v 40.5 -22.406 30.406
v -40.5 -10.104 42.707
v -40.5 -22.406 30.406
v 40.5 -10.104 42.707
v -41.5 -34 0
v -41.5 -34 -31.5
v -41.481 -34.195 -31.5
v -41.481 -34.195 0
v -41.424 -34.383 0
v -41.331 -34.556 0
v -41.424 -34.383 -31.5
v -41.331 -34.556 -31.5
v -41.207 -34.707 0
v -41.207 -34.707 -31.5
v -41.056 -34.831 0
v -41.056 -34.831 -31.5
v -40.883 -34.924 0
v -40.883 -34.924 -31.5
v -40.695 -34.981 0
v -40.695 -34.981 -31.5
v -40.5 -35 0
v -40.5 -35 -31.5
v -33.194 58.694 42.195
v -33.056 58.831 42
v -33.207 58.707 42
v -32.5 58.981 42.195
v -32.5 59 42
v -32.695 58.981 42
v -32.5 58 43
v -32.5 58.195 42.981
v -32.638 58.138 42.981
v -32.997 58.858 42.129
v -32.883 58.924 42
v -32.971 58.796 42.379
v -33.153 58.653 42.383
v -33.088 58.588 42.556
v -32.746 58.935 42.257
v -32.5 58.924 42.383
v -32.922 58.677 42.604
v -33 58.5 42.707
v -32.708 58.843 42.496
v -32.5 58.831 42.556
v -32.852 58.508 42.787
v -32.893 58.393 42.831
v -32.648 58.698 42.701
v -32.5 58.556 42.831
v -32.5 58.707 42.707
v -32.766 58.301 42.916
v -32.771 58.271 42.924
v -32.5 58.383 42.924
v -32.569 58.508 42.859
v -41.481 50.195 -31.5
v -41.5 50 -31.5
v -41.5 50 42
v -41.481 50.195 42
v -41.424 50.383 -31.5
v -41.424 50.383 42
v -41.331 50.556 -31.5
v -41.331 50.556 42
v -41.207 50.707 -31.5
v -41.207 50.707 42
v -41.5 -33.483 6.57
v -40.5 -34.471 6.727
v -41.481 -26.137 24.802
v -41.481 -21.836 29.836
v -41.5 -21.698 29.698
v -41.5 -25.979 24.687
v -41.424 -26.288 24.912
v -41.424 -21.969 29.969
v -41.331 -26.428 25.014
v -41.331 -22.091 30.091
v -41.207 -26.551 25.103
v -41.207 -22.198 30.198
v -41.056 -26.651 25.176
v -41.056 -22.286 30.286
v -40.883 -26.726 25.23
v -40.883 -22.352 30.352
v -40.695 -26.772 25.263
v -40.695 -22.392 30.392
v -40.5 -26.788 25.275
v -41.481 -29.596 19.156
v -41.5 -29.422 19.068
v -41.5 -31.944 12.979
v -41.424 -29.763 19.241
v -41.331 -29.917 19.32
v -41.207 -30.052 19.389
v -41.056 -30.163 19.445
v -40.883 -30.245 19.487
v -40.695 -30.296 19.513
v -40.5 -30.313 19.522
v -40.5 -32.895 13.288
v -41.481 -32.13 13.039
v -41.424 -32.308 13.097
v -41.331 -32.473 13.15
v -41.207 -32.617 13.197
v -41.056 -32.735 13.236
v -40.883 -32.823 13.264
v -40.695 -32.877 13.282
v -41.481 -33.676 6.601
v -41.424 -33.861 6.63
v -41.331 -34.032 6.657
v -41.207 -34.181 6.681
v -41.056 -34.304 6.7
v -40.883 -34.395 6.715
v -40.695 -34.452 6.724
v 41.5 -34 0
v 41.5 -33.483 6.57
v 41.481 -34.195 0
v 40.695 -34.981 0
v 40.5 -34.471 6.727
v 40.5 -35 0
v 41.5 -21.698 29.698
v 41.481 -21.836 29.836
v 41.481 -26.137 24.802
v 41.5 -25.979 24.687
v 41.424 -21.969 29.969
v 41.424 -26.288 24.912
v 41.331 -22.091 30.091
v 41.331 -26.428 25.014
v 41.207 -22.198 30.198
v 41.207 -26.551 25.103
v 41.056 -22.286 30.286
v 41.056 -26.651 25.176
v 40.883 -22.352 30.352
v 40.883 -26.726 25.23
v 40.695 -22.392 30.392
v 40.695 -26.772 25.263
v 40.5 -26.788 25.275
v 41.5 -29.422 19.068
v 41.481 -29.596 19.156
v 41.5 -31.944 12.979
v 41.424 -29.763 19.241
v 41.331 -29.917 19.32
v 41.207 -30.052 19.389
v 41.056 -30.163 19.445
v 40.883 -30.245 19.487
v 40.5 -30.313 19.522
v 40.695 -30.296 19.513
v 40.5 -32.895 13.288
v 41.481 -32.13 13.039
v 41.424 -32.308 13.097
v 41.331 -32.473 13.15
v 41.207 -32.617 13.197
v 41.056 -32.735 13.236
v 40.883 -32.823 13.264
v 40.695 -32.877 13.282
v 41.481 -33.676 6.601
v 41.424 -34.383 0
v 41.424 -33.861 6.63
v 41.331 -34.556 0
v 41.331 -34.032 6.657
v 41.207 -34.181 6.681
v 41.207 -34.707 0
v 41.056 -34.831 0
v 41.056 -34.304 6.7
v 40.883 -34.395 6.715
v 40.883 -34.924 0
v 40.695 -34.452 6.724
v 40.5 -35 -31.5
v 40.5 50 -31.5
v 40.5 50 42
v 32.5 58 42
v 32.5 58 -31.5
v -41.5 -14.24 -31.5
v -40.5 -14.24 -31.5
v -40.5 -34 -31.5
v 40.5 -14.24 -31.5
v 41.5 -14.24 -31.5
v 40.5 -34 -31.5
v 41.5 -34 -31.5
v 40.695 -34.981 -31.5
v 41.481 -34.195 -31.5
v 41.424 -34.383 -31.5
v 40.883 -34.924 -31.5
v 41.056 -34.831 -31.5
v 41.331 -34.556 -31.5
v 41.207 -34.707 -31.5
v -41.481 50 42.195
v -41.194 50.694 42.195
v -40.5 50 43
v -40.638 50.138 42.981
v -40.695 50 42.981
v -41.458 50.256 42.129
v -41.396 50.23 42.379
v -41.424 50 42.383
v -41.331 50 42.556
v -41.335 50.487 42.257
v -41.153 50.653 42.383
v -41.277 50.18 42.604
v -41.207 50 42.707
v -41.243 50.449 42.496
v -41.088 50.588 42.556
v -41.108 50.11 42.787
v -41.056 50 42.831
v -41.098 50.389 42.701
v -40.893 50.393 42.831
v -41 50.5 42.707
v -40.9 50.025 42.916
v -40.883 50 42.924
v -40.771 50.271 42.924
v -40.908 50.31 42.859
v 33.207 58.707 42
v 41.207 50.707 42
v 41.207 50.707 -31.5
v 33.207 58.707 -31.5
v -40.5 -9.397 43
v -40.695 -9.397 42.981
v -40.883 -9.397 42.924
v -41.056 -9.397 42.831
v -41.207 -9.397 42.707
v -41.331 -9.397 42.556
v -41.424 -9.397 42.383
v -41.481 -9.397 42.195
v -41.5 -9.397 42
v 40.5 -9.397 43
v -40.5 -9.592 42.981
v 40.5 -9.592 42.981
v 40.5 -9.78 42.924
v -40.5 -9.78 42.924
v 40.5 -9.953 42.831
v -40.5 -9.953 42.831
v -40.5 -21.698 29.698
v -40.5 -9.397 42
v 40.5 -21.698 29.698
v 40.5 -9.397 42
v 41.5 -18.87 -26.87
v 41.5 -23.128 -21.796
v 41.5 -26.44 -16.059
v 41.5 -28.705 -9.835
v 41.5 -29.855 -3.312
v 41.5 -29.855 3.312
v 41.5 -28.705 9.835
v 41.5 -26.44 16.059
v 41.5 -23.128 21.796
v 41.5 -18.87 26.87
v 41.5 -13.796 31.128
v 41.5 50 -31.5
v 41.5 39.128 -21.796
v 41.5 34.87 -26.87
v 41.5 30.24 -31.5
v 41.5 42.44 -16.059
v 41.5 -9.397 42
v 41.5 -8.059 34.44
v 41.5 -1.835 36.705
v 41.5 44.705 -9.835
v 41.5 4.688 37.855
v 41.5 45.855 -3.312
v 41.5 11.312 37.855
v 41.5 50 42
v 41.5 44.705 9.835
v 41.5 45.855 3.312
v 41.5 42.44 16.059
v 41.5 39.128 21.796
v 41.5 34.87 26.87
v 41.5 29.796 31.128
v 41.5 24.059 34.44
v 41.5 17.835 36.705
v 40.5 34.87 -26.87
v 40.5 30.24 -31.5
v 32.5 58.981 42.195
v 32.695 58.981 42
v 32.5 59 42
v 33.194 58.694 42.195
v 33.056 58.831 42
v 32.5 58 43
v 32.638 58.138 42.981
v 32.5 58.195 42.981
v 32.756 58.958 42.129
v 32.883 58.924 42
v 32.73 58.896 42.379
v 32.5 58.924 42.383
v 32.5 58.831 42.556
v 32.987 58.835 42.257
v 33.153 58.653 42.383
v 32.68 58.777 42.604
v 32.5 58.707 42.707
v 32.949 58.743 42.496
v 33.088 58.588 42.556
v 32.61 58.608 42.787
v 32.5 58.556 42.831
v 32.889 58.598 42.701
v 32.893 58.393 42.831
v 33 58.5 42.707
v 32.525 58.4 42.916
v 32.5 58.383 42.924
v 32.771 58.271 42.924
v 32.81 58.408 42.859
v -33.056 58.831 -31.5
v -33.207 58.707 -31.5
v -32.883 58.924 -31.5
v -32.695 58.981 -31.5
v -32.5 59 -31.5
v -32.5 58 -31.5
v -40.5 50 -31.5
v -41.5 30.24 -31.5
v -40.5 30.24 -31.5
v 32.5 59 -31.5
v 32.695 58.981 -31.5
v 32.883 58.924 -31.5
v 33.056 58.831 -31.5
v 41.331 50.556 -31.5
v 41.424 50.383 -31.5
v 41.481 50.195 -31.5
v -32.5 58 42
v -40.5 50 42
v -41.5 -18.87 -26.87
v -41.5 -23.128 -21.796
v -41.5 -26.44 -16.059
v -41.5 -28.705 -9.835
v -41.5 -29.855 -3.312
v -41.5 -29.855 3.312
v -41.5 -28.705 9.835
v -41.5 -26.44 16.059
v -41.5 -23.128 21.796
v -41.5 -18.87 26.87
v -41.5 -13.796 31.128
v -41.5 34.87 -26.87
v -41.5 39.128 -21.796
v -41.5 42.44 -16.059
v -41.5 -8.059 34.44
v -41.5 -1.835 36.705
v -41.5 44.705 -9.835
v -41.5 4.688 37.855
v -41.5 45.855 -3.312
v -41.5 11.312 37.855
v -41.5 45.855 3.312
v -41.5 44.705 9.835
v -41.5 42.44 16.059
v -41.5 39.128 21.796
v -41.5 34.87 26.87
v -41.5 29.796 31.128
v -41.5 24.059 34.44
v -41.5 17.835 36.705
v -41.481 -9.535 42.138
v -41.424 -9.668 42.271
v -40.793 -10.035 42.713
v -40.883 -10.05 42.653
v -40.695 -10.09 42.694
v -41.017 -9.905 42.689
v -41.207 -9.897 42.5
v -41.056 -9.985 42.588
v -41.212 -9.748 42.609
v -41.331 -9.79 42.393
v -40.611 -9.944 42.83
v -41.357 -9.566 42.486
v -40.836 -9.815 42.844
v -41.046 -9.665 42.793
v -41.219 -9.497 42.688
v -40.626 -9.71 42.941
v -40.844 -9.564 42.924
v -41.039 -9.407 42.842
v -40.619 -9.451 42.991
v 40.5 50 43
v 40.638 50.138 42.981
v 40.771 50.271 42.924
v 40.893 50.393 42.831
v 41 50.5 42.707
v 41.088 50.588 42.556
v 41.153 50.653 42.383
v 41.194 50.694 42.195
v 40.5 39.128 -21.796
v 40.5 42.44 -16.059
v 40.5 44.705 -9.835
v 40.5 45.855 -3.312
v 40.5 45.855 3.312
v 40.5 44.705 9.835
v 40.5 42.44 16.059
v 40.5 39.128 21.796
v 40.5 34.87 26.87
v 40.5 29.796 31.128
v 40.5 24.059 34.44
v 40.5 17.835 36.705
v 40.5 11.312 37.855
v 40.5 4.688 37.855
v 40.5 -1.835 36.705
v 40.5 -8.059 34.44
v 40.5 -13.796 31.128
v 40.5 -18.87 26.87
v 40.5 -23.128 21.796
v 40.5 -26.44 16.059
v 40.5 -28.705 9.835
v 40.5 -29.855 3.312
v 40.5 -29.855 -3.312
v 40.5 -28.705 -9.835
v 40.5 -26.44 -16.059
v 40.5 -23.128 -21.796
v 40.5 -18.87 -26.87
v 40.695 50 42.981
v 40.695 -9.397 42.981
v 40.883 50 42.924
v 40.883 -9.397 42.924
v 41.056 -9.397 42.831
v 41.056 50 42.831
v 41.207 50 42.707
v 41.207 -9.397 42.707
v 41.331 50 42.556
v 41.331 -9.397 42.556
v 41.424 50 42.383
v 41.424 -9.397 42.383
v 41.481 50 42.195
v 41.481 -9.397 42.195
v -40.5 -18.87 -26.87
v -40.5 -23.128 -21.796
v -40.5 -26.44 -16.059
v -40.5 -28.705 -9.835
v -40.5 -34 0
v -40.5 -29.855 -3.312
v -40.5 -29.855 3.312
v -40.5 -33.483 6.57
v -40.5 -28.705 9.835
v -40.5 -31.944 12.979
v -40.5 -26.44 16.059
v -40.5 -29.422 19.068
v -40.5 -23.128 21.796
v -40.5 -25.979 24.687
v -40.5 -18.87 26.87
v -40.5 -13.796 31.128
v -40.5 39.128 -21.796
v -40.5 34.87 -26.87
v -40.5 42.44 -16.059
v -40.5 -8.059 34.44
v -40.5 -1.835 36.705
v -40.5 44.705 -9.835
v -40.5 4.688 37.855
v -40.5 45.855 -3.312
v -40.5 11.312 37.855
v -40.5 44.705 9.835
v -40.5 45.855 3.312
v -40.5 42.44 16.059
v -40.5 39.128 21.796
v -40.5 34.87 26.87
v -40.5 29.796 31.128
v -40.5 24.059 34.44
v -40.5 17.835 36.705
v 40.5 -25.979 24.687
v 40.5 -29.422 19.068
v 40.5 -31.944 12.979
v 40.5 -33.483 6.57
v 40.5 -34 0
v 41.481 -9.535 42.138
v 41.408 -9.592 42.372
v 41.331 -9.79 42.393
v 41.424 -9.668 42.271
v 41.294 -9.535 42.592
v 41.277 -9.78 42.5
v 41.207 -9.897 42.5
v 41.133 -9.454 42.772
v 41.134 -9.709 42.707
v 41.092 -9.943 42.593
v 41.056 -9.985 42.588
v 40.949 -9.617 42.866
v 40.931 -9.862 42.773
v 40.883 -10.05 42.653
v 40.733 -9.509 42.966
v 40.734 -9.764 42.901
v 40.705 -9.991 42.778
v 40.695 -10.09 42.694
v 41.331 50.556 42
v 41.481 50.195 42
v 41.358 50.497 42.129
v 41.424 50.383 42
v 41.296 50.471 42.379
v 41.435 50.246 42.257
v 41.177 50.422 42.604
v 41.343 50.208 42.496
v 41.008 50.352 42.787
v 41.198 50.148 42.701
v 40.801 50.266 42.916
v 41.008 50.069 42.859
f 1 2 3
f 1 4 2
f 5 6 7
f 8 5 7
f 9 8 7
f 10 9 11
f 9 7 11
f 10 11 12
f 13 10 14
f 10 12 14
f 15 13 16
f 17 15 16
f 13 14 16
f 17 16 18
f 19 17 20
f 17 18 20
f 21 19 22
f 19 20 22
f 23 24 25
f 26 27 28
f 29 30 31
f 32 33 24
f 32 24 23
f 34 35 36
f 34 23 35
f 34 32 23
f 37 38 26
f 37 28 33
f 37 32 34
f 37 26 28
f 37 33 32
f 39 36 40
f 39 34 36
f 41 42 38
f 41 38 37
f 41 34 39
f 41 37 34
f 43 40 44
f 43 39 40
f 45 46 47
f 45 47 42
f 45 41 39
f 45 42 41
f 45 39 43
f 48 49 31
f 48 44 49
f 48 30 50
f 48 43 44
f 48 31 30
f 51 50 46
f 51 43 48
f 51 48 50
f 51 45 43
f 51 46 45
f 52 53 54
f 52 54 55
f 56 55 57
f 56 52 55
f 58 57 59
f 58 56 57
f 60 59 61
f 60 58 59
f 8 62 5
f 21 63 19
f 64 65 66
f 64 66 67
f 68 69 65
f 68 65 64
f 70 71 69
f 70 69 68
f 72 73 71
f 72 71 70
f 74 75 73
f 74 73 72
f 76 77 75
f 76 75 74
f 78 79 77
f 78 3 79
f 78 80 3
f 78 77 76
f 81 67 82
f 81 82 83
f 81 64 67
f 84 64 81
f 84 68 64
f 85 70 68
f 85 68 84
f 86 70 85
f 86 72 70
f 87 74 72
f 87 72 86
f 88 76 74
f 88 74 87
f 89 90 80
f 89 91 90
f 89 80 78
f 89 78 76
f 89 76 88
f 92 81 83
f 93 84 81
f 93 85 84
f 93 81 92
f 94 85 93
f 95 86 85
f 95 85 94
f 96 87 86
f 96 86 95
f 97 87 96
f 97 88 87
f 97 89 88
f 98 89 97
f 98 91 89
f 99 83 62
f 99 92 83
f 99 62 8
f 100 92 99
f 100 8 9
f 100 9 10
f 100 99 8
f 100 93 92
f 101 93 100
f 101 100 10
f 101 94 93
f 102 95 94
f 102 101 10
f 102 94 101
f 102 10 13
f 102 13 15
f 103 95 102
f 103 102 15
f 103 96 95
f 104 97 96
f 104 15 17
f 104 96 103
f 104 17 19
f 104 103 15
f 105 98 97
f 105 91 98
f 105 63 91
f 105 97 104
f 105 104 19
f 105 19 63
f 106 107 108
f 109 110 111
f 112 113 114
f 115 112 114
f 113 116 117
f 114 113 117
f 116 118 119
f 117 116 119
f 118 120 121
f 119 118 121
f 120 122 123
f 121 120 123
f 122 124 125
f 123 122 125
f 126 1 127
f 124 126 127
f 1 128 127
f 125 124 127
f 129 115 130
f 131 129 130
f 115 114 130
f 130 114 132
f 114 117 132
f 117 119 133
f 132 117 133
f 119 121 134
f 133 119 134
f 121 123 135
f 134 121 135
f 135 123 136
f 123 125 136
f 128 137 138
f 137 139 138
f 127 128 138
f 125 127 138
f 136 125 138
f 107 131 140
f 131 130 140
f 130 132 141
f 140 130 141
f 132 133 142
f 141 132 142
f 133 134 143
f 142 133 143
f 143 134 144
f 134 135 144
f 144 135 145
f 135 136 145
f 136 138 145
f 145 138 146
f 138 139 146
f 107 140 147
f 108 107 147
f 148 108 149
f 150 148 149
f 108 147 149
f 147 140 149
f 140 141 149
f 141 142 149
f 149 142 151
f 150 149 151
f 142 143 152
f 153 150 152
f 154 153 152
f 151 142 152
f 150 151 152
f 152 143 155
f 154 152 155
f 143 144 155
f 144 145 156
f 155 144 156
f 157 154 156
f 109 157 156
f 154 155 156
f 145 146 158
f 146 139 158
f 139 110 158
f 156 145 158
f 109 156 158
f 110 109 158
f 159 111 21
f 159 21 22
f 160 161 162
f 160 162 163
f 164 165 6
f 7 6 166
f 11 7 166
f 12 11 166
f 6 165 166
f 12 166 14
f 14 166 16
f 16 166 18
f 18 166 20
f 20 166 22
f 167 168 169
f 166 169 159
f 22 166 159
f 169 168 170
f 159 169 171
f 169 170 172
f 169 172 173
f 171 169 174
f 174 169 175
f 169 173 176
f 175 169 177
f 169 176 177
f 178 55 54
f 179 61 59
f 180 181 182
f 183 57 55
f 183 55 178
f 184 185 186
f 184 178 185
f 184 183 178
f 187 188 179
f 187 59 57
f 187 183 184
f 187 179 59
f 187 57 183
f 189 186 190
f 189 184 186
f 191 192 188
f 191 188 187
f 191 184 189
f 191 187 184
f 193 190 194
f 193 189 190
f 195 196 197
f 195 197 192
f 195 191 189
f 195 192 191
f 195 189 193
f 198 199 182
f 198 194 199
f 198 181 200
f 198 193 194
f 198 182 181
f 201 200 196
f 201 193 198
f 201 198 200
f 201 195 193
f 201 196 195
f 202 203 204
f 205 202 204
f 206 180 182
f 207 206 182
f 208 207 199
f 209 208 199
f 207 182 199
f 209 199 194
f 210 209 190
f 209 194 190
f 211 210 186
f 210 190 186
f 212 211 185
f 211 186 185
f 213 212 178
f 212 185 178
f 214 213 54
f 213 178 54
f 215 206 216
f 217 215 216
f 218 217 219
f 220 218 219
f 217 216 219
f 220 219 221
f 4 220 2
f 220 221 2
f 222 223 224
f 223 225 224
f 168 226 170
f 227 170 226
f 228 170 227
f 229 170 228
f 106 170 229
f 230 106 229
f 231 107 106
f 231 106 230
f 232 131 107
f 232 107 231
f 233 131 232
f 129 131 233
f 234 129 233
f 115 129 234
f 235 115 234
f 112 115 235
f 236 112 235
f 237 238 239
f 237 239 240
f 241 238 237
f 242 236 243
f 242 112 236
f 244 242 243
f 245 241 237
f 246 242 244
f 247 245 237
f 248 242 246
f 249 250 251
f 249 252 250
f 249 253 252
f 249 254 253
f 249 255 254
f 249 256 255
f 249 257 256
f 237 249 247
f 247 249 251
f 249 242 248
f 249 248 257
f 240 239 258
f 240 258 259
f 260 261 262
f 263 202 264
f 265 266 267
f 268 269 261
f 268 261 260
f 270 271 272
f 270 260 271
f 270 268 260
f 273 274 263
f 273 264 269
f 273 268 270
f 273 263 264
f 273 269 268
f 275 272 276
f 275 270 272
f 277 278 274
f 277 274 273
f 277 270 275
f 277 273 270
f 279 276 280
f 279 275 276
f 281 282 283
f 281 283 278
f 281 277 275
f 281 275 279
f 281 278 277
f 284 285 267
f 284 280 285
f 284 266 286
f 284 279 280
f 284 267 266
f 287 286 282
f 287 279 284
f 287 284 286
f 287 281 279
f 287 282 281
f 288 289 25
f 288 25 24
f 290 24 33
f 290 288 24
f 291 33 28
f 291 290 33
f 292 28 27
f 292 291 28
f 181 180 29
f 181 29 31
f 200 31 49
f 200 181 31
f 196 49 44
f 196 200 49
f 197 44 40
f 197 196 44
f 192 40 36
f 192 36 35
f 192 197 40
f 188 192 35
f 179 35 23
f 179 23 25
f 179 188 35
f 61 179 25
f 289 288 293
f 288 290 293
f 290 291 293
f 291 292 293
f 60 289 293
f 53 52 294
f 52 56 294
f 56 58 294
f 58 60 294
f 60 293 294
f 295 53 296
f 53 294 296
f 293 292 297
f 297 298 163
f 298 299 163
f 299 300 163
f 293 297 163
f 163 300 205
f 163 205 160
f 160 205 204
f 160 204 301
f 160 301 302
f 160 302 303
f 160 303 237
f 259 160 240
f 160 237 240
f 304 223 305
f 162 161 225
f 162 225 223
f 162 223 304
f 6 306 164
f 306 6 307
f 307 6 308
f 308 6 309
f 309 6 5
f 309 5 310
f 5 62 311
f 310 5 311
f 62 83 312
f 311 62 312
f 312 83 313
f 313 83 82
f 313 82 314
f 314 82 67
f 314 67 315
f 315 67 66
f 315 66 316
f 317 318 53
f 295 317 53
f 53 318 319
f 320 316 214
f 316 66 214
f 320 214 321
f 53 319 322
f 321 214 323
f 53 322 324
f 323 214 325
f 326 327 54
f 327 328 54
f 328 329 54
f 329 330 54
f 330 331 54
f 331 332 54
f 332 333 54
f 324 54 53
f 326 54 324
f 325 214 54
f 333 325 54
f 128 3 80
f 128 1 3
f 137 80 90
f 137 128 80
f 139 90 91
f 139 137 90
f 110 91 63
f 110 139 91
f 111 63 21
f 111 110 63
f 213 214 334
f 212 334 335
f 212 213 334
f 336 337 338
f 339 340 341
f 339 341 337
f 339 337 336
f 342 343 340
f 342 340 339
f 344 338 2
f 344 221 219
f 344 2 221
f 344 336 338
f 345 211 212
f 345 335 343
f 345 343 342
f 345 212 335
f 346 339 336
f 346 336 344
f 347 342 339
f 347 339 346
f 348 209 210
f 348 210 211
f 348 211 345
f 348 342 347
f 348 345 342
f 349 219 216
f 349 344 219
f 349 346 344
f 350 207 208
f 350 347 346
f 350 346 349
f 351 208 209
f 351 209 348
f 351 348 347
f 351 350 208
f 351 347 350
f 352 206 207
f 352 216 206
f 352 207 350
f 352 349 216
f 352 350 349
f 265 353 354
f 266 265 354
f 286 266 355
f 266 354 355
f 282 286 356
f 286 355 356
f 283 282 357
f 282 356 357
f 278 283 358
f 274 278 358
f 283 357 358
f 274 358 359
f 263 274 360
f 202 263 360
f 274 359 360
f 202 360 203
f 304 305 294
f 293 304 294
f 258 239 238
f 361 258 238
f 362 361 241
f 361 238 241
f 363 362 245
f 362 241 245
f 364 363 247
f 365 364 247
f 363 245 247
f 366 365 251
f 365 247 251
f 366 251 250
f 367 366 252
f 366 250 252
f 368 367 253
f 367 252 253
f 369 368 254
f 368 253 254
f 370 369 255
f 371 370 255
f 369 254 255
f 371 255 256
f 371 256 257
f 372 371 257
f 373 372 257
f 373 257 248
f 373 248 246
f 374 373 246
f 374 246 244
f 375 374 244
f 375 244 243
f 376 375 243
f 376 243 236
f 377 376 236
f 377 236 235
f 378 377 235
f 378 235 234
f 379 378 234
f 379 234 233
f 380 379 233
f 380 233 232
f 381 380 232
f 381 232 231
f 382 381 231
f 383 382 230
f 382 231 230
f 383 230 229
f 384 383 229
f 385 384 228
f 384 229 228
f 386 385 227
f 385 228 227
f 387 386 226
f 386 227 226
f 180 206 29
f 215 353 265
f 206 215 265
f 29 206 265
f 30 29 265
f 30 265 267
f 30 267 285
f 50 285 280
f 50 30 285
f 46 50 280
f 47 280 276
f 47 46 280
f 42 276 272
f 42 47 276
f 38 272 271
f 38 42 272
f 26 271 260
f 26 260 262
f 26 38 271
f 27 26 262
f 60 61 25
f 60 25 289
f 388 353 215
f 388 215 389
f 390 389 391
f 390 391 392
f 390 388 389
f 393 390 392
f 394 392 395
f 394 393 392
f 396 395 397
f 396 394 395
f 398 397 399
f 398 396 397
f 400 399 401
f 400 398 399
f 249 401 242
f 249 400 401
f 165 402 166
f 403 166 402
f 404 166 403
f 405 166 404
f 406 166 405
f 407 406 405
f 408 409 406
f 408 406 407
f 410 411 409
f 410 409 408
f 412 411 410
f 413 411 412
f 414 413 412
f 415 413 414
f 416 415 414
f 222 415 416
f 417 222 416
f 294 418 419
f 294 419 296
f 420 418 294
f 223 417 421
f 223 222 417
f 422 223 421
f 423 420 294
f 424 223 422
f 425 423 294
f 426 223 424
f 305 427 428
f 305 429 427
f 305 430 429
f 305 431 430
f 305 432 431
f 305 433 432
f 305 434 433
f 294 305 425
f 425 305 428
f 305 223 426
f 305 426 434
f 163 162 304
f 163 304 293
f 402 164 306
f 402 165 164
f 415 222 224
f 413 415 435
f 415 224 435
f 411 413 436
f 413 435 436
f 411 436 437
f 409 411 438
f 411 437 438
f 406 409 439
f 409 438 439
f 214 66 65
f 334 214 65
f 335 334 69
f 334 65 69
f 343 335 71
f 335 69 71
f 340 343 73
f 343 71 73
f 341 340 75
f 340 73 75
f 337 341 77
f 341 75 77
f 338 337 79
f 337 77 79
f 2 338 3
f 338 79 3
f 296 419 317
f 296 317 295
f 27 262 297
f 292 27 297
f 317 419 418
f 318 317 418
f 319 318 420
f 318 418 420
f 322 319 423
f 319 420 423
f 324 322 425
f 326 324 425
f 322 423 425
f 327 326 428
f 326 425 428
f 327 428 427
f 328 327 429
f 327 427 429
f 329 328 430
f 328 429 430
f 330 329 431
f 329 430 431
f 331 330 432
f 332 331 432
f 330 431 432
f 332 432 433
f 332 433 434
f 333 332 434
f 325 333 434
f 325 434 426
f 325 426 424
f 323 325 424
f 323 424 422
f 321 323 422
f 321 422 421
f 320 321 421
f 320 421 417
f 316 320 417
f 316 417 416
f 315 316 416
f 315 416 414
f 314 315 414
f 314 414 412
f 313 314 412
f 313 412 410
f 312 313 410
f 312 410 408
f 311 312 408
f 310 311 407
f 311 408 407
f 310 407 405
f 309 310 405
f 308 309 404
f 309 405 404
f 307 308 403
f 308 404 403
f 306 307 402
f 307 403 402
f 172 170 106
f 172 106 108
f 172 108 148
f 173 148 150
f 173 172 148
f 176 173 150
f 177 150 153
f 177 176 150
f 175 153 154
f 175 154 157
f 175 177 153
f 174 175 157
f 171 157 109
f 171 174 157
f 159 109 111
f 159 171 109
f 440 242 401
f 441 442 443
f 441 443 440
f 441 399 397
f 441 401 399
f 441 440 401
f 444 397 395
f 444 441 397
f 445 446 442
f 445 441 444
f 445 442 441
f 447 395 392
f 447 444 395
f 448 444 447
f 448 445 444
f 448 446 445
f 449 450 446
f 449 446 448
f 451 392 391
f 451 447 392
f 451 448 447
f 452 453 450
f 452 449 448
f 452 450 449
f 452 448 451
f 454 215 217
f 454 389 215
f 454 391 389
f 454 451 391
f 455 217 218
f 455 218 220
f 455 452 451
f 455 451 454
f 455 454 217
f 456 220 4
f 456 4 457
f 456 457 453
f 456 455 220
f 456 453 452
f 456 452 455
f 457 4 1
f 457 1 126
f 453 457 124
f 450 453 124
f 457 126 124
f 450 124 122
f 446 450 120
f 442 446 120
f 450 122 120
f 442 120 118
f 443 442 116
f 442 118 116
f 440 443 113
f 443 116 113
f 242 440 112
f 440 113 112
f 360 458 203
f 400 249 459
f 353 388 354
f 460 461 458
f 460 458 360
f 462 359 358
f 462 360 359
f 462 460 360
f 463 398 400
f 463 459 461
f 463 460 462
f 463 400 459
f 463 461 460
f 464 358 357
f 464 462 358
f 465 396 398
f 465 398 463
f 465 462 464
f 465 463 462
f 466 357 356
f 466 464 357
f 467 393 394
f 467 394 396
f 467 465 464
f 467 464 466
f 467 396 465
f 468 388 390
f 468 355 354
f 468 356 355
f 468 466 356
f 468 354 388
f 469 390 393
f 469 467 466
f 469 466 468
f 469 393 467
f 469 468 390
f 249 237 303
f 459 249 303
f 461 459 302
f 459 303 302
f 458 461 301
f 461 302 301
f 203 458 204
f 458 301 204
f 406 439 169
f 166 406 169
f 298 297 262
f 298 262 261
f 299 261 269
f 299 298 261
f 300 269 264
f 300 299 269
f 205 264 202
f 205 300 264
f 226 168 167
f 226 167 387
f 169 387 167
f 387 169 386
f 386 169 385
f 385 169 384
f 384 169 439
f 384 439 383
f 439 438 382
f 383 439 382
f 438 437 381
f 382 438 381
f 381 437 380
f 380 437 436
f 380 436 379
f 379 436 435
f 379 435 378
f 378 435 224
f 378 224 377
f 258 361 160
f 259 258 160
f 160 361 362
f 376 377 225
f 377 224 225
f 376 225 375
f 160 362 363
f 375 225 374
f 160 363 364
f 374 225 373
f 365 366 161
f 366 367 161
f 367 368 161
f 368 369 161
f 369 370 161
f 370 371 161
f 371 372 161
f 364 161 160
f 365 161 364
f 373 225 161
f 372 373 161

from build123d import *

# Parameters (mm, degrees)
PAD006_DEPTH    = 40.5
CHAMFER017_SIZE = 8
THICKNESS_T     = 1
POCKET015_DEPTH = 83.001


with BuildPart() as part:
    # Sketch022 → Pad006 (new body, symmetric)
    with BuildSketch(Plane.YZ):
        with BuildLine():
            ThreePointArc((-21.698485, 29.698485), (-30.80294, 16.072704), (-34, 0))
            Line((-34, 0), (-34, -31.5))
            Line((58, -31.5), (-34, -31.5))
            Line((58, 42), (58, -31.5))
            Line((-9.39697, 42), (58, 42))
            Line((-9.39697, 42), (-21.698485, 29.698485))
        make_face()
    extrude(amount=PAD006_DEPTH, both=True)

    # Chamfer017
    chamfer017_edges = [part.edges().sort_by_distance(p)[0] for p in [
        (-40.5, 58, 5.25),
        (40.5, 58, 5.25),
    ]]
    chamfer(chamfer017_edges, length=CHAMFER017_SIZE)

    # Thickness
    thickness_openings = [part.faces().sort_by_distance(p)[0] for p in [
        (0, 11.624616, -31.5),
    ]]
    offset(amount=THICKNESS_T, openings=thickness_openings)

    # Sketch023 → Pocket015 (cut, through all)
    with BuildSketch(Plane.YZ.offset(41.5)):
        with BuildLine():
            ThreePointArc((34.870058, -26.870058), (8, 38), (-18.870058, -26.870058))
            Line((-8.240115, -37.5), (-18.870058, -26.870058))
            Line((24.240115, -37.5), (-8.240115, -37.5))
            Line((34.870058, -26.870058), (24.240115, -37.5))
        make_face()
    extrude(amount=-POCKET015_DEPTH, mode=Mode.SUBTRACT)


solid = part.part
